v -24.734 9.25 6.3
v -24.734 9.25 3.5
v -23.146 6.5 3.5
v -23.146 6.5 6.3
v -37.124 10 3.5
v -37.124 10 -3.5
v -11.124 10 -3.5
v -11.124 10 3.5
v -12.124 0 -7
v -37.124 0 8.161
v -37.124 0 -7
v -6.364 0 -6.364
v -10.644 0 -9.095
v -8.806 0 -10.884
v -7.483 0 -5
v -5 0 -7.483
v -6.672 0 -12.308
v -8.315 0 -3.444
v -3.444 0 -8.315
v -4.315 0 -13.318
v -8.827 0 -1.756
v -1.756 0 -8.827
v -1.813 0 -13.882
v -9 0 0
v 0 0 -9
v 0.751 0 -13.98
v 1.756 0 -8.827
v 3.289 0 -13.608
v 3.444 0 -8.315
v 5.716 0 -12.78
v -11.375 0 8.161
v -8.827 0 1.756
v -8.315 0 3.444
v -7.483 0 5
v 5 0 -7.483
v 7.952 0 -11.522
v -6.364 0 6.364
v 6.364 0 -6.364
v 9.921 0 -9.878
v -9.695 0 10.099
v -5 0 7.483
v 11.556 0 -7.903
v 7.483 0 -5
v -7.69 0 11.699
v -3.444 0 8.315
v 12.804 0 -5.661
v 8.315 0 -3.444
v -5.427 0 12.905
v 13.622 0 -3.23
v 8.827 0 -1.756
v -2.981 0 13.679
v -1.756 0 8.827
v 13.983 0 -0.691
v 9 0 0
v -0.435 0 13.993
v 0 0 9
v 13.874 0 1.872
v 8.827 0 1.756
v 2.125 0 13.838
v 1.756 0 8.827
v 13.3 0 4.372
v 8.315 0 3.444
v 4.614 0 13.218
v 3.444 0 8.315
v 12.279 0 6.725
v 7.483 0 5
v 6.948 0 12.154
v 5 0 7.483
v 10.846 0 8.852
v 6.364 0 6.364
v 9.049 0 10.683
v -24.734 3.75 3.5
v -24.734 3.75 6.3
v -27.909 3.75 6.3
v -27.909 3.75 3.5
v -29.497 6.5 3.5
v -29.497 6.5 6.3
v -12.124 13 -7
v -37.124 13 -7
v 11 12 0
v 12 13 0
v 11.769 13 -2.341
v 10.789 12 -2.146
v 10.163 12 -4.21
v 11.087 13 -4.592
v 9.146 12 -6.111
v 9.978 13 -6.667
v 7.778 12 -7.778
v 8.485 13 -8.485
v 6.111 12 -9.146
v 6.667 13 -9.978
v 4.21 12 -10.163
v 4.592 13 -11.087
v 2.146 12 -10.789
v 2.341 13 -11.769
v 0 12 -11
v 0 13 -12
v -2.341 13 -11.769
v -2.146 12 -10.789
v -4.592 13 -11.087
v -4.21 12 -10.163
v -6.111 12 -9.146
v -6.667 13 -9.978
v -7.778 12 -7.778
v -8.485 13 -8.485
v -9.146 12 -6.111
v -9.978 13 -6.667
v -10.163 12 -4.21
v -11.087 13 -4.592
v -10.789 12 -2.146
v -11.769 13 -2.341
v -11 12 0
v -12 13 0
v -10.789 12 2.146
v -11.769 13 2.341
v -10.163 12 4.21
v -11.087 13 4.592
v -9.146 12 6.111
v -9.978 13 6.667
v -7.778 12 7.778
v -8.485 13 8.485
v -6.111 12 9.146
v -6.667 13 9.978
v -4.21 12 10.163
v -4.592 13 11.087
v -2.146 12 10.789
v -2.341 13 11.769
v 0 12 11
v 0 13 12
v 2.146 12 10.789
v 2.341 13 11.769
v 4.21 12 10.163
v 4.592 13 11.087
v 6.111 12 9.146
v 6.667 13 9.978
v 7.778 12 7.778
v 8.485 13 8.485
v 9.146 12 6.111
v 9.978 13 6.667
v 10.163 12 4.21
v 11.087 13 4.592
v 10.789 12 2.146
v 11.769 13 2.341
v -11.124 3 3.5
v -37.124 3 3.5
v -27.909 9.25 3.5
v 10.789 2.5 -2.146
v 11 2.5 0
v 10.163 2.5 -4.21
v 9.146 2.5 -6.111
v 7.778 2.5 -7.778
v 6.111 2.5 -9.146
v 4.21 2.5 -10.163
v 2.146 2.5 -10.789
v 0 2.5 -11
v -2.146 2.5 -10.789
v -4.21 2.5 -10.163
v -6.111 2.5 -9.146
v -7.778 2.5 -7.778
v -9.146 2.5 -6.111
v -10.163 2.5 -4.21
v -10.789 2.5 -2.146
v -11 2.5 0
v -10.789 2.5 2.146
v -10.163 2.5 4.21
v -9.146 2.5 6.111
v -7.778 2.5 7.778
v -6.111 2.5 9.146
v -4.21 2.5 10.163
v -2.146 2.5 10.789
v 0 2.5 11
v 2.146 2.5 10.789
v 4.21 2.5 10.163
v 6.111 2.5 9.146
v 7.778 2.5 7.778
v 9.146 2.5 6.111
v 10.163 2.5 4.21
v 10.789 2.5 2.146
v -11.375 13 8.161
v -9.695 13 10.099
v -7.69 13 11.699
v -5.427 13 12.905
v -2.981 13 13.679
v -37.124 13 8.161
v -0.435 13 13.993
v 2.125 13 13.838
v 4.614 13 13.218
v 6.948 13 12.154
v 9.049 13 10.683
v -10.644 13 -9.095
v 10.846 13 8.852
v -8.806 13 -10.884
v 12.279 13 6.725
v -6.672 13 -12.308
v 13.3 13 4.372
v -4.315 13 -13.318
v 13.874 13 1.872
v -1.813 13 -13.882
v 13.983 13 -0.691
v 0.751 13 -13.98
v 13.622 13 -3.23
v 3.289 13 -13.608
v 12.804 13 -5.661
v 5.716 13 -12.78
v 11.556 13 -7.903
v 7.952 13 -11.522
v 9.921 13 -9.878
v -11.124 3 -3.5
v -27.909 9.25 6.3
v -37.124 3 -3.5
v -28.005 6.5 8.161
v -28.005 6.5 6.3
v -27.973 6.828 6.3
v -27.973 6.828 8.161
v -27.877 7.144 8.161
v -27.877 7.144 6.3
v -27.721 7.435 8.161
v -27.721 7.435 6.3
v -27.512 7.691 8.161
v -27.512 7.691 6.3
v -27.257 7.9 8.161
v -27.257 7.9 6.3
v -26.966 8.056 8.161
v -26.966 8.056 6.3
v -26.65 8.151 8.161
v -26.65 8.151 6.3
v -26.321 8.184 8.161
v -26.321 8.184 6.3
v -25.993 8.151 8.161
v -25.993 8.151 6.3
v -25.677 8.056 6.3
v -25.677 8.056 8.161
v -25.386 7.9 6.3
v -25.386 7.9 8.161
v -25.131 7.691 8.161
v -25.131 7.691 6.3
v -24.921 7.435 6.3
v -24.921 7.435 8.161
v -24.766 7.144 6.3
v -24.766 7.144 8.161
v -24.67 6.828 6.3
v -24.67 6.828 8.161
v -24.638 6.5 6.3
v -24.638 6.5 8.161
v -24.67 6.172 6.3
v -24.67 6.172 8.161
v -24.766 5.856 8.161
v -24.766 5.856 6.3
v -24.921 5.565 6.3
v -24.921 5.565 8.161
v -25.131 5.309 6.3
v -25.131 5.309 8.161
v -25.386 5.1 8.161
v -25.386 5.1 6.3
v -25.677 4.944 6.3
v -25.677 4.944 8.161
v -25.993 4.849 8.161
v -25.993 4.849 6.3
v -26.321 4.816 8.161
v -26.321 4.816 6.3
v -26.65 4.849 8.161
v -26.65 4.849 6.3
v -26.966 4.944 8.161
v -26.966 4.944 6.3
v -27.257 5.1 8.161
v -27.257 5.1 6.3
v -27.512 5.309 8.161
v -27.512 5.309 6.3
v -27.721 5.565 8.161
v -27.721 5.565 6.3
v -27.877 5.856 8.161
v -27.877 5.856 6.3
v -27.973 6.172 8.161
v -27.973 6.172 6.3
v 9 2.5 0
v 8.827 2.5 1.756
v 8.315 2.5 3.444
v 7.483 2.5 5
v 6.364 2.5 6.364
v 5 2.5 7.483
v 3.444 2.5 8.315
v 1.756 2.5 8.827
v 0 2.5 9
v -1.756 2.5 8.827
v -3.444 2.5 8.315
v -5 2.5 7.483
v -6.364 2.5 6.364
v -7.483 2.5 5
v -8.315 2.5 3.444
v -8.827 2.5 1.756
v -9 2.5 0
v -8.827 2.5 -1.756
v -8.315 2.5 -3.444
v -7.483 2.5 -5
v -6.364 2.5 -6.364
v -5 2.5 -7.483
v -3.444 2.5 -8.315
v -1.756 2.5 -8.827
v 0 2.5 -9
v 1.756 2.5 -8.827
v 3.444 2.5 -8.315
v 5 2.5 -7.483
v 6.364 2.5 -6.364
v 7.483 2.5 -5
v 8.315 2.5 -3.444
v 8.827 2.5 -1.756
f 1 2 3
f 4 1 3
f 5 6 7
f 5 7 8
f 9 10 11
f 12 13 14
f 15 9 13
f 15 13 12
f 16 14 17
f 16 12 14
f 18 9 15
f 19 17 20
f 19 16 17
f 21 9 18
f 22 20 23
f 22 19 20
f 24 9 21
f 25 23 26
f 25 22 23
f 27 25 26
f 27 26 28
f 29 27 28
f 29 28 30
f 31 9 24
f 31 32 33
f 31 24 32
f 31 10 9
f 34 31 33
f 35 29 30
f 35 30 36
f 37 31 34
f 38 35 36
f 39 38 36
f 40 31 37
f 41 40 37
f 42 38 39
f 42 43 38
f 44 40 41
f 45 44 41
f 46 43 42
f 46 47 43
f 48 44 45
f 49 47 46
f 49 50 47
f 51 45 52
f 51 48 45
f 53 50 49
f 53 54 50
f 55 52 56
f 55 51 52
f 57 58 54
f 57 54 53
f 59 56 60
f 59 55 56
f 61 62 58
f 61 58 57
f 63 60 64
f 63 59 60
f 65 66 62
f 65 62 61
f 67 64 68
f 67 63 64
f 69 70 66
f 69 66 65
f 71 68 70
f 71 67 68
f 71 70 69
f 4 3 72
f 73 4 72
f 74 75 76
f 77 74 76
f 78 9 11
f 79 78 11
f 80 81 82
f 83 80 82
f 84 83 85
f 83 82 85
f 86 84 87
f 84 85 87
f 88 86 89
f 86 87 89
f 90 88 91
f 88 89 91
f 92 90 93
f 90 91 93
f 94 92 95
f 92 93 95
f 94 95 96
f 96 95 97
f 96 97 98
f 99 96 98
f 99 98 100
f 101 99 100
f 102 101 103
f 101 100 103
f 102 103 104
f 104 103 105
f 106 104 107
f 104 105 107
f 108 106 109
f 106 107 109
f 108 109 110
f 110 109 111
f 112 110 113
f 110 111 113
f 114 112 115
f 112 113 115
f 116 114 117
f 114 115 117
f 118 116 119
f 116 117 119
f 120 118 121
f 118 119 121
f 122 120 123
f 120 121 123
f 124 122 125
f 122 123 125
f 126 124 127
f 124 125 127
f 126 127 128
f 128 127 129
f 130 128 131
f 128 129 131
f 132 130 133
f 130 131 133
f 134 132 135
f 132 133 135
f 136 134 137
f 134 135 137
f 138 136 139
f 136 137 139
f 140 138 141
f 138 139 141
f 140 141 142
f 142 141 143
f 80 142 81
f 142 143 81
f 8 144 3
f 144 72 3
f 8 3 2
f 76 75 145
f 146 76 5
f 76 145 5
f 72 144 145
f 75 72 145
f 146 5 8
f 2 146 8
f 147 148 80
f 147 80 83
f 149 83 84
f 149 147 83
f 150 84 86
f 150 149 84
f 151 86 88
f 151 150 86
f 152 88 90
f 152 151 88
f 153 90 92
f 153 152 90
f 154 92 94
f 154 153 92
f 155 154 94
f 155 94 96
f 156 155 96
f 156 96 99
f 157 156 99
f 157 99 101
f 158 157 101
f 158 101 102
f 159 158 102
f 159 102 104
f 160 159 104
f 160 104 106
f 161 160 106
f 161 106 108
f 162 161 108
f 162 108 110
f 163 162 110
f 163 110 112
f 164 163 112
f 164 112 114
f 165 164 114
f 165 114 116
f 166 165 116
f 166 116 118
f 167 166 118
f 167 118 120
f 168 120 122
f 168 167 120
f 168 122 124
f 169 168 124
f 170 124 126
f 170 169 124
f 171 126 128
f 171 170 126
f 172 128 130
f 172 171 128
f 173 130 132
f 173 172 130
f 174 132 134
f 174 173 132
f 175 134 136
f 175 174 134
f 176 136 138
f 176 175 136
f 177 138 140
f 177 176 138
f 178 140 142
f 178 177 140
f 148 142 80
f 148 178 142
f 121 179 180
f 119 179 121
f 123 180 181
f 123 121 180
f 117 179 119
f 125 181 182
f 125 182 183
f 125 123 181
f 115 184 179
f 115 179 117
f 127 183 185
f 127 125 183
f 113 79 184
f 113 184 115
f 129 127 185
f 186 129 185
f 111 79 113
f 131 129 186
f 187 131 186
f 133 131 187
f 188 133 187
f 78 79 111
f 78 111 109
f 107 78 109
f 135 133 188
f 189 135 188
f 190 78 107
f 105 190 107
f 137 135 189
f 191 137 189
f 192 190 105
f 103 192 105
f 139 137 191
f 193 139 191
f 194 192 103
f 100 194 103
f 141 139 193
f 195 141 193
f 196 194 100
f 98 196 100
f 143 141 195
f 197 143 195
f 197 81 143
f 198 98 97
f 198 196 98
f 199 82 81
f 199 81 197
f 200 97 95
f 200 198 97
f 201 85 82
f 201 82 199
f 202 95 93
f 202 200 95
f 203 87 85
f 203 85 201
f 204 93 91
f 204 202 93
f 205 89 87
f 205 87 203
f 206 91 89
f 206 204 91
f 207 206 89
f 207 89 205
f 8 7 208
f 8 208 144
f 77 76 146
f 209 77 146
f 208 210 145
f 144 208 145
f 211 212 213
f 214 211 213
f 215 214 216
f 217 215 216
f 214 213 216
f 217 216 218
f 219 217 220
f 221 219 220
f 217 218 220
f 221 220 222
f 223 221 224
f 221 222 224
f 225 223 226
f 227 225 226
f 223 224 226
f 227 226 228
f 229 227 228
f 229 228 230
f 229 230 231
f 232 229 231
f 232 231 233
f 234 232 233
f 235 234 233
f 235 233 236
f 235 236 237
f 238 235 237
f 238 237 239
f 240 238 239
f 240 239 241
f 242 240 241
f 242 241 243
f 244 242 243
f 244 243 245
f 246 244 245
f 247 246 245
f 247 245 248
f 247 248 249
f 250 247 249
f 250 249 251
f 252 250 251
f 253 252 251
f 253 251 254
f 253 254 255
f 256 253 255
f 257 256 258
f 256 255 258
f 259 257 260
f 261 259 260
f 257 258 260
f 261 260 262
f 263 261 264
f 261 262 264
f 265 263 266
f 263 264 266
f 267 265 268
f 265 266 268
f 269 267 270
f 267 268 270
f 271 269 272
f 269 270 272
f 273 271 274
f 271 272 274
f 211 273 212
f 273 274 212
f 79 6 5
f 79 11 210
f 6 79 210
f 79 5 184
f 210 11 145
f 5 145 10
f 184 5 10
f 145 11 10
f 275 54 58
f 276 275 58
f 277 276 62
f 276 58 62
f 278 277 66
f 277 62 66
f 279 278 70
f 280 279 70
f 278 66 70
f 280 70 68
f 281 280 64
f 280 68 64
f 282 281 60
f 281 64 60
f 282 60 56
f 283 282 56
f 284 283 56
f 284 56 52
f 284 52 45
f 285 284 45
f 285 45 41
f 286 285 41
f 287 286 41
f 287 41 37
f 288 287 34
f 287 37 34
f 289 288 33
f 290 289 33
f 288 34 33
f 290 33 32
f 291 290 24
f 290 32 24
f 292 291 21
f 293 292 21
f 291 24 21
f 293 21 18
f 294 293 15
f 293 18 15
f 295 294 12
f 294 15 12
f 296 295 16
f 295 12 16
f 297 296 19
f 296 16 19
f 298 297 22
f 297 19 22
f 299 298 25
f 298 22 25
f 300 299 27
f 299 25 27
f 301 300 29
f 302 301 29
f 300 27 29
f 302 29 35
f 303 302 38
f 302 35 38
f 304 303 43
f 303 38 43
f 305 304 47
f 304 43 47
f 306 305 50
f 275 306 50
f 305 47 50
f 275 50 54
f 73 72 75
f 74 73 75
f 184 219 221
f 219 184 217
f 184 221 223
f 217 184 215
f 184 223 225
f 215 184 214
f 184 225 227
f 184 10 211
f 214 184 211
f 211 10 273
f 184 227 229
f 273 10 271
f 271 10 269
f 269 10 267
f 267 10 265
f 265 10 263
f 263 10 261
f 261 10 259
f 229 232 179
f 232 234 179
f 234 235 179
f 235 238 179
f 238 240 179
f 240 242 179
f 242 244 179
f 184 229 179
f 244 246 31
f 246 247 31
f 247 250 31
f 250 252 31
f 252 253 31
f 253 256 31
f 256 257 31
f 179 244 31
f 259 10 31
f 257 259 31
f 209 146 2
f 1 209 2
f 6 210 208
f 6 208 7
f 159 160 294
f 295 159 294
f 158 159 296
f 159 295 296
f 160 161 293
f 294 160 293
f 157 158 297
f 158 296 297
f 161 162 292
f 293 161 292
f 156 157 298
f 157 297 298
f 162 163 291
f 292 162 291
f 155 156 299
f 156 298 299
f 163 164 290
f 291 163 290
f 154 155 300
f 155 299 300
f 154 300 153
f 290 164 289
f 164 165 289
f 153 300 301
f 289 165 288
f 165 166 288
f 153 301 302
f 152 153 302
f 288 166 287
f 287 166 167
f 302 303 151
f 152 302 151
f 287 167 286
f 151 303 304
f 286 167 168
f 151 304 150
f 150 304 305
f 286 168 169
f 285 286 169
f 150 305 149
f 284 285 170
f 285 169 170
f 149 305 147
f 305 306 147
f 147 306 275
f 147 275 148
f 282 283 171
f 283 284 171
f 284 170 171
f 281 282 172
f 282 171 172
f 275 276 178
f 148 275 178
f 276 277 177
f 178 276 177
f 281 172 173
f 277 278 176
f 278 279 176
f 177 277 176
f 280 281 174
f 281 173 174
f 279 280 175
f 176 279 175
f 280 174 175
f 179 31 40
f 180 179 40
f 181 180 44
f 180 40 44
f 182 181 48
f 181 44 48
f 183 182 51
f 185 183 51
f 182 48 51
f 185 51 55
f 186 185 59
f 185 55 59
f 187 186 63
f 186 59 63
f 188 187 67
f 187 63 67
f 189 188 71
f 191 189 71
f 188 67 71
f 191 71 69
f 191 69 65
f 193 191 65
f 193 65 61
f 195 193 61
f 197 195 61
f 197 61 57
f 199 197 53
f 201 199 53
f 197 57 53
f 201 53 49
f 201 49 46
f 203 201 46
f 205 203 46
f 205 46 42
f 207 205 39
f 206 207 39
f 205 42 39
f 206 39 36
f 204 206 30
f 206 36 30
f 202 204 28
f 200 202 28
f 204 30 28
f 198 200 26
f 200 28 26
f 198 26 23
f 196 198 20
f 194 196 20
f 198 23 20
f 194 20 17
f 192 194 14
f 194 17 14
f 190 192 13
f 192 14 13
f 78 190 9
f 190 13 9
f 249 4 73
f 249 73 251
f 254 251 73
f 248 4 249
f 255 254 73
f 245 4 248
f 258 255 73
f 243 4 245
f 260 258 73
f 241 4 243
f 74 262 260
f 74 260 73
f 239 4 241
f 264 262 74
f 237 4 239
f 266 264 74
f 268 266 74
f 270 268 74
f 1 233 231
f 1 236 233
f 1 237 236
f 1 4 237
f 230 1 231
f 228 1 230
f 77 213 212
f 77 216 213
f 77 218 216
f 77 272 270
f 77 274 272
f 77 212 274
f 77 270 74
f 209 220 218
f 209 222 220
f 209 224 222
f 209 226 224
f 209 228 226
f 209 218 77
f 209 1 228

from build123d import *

# Parameters (mm, degrees)
ESBO_O2_R                = 11
RESSALTO_EXTRUS_O1_DEPTH = 13
ESBO_O3_W                = 7
ESBO_O3_H                = 7
CORTE_EXTRUS_O1_DEPTH    = 26
CORTE_EXTRUS_O2_DEPTH    = 2.8
ESBO_O10_R               = 1.683661958
CORTE_EXTRUS_O3_DEPTH    = 2.8
ESBO_O11_R               = 11
ESBO_O11_R_2             = 9
RESSALTO_EXTRUS_O2_DEPTH = 2.5
CHANFRO1_SIZE            = 1


with BuildPart() as part:
    # Esboço2 → Ressalto-extrusão1 (new body)
    with BuildSketch(Plane(origin=(0, 0, 0), x_dir=(1, 0, 0), z_dir=(0, 1, 0))):
        with BuildLine():
            Line((-12.124355653, 7), (-37.124355653, 7))
            Line((-37.124355653, 7), (-37.124355653, -8.161034979))
            Line((-37.124355653, -8.161034979), (-11.375302548, -8.161034979))
            ThreePointArc((-11.375302548, -8.161034979), (13.982944229, 0.690847808), (-12.124355653, 7))
        make_face()
        Circle(ESBO_O2_R, mode=Mode.SUBTRACT)
    extrude(amount=RESSALTO_EXTRUS_O1_DEPTH)

    # Esboço3 → Corte-extrusão1 (cut)
    with BuildSketch(Plane.ZY.offset(37.124355653)):
        with Locations((0, 6.5)):
            Rectangle(ESBO_O3_W, ESBO_O3_H)
    extrude(amount=-CORTE_EXTRUS_O1_DEPTH, mode=Mode.SUBTRACT)

    # Esboço7 → Corte-extrusão2 (cut)
    with BuildSketch(Plane(origin=(0, 0, 3.5), x_dir=(-1, 0, 0), z_dir=(0, 0, -1))):
        Polygon((23.145814462, 6.5), (24.733527702, 3.75), (27.908954183, 3.75), (29.496667423, 6.5), (27.908954183, 9.25), (24.733527702, 9.25), align=None)
    extrude(amount=-CORTE_EXTRUS_O2_DEPTH, mode=Mode.SUBTRACT)

    # Esboço10 → Corte-extrusão3 (cut)
    with BuildSketch(Plane(origin=(0, 0, 6.3), x_dir=(-1, 0, 0), z_dir=(0, 0, -1))):
        with Locations((26.321240942, 6.5)):
            Circle(ESBO_O10_R)
    extrude(amount=-CORTE_EXTRUS_O3_DEPTH, mode=Mode.SUBTRACT)

    # Esboço11 → Ressalto-extrusão2 (add)
    with BuildSketch(Plane.XZ):
        Circle(ESBO_O11_R)
        Circle(ESBO_O11_R_2, mode=Mode.SUBTRACT)
    extrude(amount=-RESSALTO_EXTRUS_O2_DEPTH)

    # Chanfro1
    chanfro1_edges = [part.edges().sort_by_distance(p)[0] for p in [
        (-11, 13, 0),
    ]]
    chamfer(chanfro1_edges, length=CHANFRO1_SIZE)


solid = part.part
